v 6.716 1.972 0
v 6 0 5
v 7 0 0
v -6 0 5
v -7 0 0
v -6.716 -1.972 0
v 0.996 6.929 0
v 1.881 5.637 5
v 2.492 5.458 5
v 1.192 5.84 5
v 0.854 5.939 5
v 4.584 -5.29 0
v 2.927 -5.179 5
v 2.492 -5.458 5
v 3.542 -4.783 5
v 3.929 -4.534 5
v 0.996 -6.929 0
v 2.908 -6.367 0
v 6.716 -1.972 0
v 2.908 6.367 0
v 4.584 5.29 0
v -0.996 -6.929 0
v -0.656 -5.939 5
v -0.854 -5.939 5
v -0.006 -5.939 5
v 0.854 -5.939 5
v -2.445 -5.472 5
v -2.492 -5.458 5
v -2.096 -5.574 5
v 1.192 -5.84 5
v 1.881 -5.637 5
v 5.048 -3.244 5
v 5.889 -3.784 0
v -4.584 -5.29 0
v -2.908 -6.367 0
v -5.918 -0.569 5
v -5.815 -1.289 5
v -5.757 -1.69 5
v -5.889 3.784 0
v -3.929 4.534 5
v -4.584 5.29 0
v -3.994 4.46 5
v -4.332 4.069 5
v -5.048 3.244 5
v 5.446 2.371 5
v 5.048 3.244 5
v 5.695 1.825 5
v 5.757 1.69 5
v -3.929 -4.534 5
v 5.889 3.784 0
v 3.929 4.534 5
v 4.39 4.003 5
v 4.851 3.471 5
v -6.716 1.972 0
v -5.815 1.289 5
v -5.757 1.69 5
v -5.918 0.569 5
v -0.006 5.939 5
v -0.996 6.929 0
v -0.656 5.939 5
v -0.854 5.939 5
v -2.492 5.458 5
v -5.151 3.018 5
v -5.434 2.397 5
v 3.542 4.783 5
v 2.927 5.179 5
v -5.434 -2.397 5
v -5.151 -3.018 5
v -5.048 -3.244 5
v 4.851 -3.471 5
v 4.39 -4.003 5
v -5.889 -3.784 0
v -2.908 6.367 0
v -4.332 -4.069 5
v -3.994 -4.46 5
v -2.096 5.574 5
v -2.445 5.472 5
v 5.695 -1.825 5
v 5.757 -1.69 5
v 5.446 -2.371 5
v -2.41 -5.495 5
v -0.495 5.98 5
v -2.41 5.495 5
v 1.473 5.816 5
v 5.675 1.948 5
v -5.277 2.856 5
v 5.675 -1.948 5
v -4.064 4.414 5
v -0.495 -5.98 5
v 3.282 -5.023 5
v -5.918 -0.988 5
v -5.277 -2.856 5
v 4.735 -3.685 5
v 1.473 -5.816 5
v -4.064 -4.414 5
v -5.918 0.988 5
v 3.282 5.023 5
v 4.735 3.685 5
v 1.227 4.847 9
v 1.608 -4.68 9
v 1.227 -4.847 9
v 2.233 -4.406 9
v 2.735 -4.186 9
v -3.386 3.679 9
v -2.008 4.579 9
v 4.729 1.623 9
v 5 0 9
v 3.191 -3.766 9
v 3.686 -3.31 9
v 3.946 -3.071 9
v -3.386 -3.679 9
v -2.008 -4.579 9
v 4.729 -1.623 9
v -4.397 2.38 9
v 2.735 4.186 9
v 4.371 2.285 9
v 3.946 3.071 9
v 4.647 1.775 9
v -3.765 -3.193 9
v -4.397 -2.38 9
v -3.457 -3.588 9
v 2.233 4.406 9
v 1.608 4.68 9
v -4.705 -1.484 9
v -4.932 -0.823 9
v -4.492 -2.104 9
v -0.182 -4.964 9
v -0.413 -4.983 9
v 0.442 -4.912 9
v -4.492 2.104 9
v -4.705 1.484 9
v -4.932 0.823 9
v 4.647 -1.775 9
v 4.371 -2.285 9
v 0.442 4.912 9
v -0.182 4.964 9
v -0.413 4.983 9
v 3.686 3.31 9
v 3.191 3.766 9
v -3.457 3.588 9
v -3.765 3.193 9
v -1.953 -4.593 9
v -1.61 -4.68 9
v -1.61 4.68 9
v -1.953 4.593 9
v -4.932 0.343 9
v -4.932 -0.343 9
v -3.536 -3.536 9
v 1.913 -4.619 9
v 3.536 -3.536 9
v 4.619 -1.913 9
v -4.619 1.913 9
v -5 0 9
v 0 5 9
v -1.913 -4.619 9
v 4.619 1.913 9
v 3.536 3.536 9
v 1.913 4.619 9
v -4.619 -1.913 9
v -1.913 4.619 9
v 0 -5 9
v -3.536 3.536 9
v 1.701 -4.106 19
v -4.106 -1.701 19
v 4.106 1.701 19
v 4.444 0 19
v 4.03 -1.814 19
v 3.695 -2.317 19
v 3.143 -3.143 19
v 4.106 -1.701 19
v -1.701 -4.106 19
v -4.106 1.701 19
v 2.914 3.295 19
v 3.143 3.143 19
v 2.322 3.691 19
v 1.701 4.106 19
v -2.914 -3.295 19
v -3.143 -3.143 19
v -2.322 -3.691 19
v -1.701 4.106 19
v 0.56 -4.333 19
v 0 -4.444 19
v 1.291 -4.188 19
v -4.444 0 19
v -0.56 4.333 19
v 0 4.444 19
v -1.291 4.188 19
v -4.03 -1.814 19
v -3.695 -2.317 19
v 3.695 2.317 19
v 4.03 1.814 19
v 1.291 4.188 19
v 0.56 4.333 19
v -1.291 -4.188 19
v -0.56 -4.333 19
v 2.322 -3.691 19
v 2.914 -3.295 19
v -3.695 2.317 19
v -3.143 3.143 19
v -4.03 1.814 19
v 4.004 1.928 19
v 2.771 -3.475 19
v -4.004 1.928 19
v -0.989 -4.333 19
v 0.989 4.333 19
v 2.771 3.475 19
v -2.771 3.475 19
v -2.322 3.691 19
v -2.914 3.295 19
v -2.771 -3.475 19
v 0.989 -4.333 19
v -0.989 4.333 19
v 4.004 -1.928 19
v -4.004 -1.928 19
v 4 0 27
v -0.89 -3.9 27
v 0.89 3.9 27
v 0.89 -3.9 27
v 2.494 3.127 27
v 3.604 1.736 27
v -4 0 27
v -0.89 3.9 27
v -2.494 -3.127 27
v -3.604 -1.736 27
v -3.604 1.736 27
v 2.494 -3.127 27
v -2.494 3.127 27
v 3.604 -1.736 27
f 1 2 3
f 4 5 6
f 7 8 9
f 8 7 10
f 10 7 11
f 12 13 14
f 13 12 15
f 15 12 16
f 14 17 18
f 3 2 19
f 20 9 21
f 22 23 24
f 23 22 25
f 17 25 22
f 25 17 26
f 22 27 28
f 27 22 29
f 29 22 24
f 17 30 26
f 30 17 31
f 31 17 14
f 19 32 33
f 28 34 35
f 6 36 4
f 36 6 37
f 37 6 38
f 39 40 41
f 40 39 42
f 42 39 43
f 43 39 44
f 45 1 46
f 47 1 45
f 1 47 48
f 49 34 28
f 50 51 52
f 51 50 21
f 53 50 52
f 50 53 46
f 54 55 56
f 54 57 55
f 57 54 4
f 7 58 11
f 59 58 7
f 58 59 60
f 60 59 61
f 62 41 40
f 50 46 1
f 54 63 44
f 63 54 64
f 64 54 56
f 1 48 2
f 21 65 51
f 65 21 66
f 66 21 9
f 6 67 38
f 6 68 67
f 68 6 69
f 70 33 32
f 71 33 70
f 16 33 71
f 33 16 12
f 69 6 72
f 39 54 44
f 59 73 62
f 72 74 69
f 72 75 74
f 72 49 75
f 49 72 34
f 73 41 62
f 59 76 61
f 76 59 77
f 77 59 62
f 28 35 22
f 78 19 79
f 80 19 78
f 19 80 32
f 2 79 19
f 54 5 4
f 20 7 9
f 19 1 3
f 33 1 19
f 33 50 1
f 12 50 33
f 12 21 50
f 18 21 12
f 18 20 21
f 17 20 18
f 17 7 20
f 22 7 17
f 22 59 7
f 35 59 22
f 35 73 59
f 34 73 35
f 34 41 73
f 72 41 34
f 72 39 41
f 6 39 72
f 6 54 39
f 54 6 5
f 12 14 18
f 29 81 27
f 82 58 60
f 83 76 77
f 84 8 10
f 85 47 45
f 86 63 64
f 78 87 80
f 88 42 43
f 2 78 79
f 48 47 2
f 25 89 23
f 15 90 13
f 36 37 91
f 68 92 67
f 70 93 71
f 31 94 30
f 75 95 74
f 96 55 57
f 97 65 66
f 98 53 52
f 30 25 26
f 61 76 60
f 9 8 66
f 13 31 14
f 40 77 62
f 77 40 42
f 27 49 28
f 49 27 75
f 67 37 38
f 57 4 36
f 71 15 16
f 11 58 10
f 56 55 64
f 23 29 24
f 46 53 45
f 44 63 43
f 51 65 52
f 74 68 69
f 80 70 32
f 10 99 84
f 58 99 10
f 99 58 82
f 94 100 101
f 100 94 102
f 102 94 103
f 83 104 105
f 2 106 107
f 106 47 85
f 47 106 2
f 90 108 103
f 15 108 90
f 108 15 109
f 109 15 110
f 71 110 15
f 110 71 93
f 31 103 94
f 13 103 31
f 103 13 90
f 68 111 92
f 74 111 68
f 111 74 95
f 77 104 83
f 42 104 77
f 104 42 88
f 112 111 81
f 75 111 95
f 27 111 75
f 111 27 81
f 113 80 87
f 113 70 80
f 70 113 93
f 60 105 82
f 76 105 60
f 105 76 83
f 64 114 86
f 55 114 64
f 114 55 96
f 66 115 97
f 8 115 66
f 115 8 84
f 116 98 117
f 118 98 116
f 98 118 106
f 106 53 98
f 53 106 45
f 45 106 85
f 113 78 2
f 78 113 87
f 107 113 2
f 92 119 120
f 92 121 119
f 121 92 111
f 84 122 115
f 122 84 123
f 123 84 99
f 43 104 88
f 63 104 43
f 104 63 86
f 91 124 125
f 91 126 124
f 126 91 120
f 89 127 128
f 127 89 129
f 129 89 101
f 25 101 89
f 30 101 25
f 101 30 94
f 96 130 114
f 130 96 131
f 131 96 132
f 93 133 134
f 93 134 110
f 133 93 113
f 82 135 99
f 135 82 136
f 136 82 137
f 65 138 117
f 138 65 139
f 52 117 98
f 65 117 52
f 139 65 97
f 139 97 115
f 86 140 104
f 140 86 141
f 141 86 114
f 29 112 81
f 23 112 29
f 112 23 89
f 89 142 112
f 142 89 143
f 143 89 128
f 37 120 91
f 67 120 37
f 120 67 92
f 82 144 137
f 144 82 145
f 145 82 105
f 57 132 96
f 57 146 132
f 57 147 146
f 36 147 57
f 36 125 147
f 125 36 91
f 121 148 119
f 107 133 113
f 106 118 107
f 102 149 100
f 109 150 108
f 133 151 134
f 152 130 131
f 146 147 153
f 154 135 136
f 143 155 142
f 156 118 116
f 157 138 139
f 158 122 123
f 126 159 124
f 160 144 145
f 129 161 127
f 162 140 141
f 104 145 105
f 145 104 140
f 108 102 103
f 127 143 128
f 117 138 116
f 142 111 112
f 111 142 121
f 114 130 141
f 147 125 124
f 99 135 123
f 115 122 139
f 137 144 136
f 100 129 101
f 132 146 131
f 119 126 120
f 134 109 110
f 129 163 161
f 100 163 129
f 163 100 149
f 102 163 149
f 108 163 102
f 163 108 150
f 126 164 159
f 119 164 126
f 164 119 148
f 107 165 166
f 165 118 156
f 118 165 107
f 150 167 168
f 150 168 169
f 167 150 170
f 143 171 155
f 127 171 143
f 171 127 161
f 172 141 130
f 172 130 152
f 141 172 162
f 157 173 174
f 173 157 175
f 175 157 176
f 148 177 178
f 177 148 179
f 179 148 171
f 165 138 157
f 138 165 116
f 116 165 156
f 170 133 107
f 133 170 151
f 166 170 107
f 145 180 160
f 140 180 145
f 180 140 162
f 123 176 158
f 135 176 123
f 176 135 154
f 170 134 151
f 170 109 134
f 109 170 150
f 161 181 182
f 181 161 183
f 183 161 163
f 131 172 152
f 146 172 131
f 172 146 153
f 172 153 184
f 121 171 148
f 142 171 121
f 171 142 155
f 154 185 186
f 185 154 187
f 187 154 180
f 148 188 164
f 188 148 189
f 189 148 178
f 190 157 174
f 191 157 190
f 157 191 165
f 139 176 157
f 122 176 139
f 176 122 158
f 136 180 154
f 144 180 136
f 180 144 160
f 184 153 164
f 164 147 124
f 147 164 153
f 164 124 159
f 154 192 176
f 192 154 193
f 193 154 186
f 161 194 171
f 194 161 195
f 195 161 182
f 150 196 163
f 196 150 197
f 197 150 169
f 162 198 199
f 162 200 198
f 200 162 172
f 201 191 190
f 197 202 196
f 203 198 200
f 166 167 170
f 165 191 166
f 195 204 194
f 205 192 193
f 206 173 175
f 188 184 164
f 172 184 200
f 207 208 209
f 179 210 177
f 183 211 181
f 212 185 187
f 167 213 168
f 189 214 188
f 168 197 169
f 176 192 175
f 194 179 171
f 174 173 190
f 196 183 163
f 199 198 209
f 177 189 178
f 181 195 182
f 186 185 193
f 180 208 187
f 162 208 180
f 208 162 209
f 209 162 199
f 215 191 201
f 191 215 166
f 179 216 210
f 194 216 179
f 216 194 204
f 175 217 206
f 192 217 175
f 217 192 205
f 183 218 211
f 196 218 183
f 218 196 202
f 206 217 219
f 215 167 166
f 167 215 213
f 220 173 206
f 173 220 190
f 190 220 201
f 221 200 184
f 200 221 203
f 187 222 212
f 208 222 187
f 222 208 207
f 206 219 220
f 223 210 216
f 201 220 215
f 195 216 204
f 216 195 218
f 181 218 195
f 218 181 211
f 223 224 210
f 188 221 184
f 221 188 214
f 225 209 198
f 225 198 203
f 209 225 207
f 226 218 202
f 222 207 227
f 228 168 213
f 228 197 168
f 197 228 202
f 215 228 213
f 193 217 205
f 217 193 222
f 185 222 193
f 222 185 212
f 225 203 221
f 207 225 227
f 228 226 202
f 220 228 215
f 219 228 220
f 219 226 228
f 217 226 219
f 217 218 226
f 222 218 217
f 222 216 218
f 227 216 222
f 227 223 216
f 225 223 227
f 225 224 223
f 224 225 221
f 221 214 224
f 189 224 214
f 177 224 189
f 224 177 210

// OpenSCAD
module lamp(r_top, r_lamp, r_middle, r_base, h_top, h_lamp, h_base_top, h_base_bottom) {
    
    // Poprawiona formuła r_upper_lamp
    r_upper_lamp = r_top+(((r_lamp - r_top)*h_top) / (h_lamp + h_top));
    
    // Podstawa
    cylinder(h_base_bottom, r1=r_base, r2=r_middle);

    // Górna część podstawy
    translate([0,0,h_base_bottom])
    cylinder(h_base_top, r1=r_middle, r2=r_lamp);

    // Główna część lampy
    translate([0,0,h_base_bottom + h_base_top])
    cylinder(h_lamp, r1=r_lamp, r2=r_upper_lamp);

    // Górna część lampy
    translate([0,0,h_base_bottom + h_base_top + h_lamp])
    cylinder(h_top, r1=r_upper_lamp, r2=r_top);
}

lamp(
    r_top = 4,
    r_lamp = 5,
    r_middle = 6,
    r_base = 7,
    h_top = 8,
    h_lamp = 10,
    h_base_top = 4,
    h_base_bottom = 5
);
